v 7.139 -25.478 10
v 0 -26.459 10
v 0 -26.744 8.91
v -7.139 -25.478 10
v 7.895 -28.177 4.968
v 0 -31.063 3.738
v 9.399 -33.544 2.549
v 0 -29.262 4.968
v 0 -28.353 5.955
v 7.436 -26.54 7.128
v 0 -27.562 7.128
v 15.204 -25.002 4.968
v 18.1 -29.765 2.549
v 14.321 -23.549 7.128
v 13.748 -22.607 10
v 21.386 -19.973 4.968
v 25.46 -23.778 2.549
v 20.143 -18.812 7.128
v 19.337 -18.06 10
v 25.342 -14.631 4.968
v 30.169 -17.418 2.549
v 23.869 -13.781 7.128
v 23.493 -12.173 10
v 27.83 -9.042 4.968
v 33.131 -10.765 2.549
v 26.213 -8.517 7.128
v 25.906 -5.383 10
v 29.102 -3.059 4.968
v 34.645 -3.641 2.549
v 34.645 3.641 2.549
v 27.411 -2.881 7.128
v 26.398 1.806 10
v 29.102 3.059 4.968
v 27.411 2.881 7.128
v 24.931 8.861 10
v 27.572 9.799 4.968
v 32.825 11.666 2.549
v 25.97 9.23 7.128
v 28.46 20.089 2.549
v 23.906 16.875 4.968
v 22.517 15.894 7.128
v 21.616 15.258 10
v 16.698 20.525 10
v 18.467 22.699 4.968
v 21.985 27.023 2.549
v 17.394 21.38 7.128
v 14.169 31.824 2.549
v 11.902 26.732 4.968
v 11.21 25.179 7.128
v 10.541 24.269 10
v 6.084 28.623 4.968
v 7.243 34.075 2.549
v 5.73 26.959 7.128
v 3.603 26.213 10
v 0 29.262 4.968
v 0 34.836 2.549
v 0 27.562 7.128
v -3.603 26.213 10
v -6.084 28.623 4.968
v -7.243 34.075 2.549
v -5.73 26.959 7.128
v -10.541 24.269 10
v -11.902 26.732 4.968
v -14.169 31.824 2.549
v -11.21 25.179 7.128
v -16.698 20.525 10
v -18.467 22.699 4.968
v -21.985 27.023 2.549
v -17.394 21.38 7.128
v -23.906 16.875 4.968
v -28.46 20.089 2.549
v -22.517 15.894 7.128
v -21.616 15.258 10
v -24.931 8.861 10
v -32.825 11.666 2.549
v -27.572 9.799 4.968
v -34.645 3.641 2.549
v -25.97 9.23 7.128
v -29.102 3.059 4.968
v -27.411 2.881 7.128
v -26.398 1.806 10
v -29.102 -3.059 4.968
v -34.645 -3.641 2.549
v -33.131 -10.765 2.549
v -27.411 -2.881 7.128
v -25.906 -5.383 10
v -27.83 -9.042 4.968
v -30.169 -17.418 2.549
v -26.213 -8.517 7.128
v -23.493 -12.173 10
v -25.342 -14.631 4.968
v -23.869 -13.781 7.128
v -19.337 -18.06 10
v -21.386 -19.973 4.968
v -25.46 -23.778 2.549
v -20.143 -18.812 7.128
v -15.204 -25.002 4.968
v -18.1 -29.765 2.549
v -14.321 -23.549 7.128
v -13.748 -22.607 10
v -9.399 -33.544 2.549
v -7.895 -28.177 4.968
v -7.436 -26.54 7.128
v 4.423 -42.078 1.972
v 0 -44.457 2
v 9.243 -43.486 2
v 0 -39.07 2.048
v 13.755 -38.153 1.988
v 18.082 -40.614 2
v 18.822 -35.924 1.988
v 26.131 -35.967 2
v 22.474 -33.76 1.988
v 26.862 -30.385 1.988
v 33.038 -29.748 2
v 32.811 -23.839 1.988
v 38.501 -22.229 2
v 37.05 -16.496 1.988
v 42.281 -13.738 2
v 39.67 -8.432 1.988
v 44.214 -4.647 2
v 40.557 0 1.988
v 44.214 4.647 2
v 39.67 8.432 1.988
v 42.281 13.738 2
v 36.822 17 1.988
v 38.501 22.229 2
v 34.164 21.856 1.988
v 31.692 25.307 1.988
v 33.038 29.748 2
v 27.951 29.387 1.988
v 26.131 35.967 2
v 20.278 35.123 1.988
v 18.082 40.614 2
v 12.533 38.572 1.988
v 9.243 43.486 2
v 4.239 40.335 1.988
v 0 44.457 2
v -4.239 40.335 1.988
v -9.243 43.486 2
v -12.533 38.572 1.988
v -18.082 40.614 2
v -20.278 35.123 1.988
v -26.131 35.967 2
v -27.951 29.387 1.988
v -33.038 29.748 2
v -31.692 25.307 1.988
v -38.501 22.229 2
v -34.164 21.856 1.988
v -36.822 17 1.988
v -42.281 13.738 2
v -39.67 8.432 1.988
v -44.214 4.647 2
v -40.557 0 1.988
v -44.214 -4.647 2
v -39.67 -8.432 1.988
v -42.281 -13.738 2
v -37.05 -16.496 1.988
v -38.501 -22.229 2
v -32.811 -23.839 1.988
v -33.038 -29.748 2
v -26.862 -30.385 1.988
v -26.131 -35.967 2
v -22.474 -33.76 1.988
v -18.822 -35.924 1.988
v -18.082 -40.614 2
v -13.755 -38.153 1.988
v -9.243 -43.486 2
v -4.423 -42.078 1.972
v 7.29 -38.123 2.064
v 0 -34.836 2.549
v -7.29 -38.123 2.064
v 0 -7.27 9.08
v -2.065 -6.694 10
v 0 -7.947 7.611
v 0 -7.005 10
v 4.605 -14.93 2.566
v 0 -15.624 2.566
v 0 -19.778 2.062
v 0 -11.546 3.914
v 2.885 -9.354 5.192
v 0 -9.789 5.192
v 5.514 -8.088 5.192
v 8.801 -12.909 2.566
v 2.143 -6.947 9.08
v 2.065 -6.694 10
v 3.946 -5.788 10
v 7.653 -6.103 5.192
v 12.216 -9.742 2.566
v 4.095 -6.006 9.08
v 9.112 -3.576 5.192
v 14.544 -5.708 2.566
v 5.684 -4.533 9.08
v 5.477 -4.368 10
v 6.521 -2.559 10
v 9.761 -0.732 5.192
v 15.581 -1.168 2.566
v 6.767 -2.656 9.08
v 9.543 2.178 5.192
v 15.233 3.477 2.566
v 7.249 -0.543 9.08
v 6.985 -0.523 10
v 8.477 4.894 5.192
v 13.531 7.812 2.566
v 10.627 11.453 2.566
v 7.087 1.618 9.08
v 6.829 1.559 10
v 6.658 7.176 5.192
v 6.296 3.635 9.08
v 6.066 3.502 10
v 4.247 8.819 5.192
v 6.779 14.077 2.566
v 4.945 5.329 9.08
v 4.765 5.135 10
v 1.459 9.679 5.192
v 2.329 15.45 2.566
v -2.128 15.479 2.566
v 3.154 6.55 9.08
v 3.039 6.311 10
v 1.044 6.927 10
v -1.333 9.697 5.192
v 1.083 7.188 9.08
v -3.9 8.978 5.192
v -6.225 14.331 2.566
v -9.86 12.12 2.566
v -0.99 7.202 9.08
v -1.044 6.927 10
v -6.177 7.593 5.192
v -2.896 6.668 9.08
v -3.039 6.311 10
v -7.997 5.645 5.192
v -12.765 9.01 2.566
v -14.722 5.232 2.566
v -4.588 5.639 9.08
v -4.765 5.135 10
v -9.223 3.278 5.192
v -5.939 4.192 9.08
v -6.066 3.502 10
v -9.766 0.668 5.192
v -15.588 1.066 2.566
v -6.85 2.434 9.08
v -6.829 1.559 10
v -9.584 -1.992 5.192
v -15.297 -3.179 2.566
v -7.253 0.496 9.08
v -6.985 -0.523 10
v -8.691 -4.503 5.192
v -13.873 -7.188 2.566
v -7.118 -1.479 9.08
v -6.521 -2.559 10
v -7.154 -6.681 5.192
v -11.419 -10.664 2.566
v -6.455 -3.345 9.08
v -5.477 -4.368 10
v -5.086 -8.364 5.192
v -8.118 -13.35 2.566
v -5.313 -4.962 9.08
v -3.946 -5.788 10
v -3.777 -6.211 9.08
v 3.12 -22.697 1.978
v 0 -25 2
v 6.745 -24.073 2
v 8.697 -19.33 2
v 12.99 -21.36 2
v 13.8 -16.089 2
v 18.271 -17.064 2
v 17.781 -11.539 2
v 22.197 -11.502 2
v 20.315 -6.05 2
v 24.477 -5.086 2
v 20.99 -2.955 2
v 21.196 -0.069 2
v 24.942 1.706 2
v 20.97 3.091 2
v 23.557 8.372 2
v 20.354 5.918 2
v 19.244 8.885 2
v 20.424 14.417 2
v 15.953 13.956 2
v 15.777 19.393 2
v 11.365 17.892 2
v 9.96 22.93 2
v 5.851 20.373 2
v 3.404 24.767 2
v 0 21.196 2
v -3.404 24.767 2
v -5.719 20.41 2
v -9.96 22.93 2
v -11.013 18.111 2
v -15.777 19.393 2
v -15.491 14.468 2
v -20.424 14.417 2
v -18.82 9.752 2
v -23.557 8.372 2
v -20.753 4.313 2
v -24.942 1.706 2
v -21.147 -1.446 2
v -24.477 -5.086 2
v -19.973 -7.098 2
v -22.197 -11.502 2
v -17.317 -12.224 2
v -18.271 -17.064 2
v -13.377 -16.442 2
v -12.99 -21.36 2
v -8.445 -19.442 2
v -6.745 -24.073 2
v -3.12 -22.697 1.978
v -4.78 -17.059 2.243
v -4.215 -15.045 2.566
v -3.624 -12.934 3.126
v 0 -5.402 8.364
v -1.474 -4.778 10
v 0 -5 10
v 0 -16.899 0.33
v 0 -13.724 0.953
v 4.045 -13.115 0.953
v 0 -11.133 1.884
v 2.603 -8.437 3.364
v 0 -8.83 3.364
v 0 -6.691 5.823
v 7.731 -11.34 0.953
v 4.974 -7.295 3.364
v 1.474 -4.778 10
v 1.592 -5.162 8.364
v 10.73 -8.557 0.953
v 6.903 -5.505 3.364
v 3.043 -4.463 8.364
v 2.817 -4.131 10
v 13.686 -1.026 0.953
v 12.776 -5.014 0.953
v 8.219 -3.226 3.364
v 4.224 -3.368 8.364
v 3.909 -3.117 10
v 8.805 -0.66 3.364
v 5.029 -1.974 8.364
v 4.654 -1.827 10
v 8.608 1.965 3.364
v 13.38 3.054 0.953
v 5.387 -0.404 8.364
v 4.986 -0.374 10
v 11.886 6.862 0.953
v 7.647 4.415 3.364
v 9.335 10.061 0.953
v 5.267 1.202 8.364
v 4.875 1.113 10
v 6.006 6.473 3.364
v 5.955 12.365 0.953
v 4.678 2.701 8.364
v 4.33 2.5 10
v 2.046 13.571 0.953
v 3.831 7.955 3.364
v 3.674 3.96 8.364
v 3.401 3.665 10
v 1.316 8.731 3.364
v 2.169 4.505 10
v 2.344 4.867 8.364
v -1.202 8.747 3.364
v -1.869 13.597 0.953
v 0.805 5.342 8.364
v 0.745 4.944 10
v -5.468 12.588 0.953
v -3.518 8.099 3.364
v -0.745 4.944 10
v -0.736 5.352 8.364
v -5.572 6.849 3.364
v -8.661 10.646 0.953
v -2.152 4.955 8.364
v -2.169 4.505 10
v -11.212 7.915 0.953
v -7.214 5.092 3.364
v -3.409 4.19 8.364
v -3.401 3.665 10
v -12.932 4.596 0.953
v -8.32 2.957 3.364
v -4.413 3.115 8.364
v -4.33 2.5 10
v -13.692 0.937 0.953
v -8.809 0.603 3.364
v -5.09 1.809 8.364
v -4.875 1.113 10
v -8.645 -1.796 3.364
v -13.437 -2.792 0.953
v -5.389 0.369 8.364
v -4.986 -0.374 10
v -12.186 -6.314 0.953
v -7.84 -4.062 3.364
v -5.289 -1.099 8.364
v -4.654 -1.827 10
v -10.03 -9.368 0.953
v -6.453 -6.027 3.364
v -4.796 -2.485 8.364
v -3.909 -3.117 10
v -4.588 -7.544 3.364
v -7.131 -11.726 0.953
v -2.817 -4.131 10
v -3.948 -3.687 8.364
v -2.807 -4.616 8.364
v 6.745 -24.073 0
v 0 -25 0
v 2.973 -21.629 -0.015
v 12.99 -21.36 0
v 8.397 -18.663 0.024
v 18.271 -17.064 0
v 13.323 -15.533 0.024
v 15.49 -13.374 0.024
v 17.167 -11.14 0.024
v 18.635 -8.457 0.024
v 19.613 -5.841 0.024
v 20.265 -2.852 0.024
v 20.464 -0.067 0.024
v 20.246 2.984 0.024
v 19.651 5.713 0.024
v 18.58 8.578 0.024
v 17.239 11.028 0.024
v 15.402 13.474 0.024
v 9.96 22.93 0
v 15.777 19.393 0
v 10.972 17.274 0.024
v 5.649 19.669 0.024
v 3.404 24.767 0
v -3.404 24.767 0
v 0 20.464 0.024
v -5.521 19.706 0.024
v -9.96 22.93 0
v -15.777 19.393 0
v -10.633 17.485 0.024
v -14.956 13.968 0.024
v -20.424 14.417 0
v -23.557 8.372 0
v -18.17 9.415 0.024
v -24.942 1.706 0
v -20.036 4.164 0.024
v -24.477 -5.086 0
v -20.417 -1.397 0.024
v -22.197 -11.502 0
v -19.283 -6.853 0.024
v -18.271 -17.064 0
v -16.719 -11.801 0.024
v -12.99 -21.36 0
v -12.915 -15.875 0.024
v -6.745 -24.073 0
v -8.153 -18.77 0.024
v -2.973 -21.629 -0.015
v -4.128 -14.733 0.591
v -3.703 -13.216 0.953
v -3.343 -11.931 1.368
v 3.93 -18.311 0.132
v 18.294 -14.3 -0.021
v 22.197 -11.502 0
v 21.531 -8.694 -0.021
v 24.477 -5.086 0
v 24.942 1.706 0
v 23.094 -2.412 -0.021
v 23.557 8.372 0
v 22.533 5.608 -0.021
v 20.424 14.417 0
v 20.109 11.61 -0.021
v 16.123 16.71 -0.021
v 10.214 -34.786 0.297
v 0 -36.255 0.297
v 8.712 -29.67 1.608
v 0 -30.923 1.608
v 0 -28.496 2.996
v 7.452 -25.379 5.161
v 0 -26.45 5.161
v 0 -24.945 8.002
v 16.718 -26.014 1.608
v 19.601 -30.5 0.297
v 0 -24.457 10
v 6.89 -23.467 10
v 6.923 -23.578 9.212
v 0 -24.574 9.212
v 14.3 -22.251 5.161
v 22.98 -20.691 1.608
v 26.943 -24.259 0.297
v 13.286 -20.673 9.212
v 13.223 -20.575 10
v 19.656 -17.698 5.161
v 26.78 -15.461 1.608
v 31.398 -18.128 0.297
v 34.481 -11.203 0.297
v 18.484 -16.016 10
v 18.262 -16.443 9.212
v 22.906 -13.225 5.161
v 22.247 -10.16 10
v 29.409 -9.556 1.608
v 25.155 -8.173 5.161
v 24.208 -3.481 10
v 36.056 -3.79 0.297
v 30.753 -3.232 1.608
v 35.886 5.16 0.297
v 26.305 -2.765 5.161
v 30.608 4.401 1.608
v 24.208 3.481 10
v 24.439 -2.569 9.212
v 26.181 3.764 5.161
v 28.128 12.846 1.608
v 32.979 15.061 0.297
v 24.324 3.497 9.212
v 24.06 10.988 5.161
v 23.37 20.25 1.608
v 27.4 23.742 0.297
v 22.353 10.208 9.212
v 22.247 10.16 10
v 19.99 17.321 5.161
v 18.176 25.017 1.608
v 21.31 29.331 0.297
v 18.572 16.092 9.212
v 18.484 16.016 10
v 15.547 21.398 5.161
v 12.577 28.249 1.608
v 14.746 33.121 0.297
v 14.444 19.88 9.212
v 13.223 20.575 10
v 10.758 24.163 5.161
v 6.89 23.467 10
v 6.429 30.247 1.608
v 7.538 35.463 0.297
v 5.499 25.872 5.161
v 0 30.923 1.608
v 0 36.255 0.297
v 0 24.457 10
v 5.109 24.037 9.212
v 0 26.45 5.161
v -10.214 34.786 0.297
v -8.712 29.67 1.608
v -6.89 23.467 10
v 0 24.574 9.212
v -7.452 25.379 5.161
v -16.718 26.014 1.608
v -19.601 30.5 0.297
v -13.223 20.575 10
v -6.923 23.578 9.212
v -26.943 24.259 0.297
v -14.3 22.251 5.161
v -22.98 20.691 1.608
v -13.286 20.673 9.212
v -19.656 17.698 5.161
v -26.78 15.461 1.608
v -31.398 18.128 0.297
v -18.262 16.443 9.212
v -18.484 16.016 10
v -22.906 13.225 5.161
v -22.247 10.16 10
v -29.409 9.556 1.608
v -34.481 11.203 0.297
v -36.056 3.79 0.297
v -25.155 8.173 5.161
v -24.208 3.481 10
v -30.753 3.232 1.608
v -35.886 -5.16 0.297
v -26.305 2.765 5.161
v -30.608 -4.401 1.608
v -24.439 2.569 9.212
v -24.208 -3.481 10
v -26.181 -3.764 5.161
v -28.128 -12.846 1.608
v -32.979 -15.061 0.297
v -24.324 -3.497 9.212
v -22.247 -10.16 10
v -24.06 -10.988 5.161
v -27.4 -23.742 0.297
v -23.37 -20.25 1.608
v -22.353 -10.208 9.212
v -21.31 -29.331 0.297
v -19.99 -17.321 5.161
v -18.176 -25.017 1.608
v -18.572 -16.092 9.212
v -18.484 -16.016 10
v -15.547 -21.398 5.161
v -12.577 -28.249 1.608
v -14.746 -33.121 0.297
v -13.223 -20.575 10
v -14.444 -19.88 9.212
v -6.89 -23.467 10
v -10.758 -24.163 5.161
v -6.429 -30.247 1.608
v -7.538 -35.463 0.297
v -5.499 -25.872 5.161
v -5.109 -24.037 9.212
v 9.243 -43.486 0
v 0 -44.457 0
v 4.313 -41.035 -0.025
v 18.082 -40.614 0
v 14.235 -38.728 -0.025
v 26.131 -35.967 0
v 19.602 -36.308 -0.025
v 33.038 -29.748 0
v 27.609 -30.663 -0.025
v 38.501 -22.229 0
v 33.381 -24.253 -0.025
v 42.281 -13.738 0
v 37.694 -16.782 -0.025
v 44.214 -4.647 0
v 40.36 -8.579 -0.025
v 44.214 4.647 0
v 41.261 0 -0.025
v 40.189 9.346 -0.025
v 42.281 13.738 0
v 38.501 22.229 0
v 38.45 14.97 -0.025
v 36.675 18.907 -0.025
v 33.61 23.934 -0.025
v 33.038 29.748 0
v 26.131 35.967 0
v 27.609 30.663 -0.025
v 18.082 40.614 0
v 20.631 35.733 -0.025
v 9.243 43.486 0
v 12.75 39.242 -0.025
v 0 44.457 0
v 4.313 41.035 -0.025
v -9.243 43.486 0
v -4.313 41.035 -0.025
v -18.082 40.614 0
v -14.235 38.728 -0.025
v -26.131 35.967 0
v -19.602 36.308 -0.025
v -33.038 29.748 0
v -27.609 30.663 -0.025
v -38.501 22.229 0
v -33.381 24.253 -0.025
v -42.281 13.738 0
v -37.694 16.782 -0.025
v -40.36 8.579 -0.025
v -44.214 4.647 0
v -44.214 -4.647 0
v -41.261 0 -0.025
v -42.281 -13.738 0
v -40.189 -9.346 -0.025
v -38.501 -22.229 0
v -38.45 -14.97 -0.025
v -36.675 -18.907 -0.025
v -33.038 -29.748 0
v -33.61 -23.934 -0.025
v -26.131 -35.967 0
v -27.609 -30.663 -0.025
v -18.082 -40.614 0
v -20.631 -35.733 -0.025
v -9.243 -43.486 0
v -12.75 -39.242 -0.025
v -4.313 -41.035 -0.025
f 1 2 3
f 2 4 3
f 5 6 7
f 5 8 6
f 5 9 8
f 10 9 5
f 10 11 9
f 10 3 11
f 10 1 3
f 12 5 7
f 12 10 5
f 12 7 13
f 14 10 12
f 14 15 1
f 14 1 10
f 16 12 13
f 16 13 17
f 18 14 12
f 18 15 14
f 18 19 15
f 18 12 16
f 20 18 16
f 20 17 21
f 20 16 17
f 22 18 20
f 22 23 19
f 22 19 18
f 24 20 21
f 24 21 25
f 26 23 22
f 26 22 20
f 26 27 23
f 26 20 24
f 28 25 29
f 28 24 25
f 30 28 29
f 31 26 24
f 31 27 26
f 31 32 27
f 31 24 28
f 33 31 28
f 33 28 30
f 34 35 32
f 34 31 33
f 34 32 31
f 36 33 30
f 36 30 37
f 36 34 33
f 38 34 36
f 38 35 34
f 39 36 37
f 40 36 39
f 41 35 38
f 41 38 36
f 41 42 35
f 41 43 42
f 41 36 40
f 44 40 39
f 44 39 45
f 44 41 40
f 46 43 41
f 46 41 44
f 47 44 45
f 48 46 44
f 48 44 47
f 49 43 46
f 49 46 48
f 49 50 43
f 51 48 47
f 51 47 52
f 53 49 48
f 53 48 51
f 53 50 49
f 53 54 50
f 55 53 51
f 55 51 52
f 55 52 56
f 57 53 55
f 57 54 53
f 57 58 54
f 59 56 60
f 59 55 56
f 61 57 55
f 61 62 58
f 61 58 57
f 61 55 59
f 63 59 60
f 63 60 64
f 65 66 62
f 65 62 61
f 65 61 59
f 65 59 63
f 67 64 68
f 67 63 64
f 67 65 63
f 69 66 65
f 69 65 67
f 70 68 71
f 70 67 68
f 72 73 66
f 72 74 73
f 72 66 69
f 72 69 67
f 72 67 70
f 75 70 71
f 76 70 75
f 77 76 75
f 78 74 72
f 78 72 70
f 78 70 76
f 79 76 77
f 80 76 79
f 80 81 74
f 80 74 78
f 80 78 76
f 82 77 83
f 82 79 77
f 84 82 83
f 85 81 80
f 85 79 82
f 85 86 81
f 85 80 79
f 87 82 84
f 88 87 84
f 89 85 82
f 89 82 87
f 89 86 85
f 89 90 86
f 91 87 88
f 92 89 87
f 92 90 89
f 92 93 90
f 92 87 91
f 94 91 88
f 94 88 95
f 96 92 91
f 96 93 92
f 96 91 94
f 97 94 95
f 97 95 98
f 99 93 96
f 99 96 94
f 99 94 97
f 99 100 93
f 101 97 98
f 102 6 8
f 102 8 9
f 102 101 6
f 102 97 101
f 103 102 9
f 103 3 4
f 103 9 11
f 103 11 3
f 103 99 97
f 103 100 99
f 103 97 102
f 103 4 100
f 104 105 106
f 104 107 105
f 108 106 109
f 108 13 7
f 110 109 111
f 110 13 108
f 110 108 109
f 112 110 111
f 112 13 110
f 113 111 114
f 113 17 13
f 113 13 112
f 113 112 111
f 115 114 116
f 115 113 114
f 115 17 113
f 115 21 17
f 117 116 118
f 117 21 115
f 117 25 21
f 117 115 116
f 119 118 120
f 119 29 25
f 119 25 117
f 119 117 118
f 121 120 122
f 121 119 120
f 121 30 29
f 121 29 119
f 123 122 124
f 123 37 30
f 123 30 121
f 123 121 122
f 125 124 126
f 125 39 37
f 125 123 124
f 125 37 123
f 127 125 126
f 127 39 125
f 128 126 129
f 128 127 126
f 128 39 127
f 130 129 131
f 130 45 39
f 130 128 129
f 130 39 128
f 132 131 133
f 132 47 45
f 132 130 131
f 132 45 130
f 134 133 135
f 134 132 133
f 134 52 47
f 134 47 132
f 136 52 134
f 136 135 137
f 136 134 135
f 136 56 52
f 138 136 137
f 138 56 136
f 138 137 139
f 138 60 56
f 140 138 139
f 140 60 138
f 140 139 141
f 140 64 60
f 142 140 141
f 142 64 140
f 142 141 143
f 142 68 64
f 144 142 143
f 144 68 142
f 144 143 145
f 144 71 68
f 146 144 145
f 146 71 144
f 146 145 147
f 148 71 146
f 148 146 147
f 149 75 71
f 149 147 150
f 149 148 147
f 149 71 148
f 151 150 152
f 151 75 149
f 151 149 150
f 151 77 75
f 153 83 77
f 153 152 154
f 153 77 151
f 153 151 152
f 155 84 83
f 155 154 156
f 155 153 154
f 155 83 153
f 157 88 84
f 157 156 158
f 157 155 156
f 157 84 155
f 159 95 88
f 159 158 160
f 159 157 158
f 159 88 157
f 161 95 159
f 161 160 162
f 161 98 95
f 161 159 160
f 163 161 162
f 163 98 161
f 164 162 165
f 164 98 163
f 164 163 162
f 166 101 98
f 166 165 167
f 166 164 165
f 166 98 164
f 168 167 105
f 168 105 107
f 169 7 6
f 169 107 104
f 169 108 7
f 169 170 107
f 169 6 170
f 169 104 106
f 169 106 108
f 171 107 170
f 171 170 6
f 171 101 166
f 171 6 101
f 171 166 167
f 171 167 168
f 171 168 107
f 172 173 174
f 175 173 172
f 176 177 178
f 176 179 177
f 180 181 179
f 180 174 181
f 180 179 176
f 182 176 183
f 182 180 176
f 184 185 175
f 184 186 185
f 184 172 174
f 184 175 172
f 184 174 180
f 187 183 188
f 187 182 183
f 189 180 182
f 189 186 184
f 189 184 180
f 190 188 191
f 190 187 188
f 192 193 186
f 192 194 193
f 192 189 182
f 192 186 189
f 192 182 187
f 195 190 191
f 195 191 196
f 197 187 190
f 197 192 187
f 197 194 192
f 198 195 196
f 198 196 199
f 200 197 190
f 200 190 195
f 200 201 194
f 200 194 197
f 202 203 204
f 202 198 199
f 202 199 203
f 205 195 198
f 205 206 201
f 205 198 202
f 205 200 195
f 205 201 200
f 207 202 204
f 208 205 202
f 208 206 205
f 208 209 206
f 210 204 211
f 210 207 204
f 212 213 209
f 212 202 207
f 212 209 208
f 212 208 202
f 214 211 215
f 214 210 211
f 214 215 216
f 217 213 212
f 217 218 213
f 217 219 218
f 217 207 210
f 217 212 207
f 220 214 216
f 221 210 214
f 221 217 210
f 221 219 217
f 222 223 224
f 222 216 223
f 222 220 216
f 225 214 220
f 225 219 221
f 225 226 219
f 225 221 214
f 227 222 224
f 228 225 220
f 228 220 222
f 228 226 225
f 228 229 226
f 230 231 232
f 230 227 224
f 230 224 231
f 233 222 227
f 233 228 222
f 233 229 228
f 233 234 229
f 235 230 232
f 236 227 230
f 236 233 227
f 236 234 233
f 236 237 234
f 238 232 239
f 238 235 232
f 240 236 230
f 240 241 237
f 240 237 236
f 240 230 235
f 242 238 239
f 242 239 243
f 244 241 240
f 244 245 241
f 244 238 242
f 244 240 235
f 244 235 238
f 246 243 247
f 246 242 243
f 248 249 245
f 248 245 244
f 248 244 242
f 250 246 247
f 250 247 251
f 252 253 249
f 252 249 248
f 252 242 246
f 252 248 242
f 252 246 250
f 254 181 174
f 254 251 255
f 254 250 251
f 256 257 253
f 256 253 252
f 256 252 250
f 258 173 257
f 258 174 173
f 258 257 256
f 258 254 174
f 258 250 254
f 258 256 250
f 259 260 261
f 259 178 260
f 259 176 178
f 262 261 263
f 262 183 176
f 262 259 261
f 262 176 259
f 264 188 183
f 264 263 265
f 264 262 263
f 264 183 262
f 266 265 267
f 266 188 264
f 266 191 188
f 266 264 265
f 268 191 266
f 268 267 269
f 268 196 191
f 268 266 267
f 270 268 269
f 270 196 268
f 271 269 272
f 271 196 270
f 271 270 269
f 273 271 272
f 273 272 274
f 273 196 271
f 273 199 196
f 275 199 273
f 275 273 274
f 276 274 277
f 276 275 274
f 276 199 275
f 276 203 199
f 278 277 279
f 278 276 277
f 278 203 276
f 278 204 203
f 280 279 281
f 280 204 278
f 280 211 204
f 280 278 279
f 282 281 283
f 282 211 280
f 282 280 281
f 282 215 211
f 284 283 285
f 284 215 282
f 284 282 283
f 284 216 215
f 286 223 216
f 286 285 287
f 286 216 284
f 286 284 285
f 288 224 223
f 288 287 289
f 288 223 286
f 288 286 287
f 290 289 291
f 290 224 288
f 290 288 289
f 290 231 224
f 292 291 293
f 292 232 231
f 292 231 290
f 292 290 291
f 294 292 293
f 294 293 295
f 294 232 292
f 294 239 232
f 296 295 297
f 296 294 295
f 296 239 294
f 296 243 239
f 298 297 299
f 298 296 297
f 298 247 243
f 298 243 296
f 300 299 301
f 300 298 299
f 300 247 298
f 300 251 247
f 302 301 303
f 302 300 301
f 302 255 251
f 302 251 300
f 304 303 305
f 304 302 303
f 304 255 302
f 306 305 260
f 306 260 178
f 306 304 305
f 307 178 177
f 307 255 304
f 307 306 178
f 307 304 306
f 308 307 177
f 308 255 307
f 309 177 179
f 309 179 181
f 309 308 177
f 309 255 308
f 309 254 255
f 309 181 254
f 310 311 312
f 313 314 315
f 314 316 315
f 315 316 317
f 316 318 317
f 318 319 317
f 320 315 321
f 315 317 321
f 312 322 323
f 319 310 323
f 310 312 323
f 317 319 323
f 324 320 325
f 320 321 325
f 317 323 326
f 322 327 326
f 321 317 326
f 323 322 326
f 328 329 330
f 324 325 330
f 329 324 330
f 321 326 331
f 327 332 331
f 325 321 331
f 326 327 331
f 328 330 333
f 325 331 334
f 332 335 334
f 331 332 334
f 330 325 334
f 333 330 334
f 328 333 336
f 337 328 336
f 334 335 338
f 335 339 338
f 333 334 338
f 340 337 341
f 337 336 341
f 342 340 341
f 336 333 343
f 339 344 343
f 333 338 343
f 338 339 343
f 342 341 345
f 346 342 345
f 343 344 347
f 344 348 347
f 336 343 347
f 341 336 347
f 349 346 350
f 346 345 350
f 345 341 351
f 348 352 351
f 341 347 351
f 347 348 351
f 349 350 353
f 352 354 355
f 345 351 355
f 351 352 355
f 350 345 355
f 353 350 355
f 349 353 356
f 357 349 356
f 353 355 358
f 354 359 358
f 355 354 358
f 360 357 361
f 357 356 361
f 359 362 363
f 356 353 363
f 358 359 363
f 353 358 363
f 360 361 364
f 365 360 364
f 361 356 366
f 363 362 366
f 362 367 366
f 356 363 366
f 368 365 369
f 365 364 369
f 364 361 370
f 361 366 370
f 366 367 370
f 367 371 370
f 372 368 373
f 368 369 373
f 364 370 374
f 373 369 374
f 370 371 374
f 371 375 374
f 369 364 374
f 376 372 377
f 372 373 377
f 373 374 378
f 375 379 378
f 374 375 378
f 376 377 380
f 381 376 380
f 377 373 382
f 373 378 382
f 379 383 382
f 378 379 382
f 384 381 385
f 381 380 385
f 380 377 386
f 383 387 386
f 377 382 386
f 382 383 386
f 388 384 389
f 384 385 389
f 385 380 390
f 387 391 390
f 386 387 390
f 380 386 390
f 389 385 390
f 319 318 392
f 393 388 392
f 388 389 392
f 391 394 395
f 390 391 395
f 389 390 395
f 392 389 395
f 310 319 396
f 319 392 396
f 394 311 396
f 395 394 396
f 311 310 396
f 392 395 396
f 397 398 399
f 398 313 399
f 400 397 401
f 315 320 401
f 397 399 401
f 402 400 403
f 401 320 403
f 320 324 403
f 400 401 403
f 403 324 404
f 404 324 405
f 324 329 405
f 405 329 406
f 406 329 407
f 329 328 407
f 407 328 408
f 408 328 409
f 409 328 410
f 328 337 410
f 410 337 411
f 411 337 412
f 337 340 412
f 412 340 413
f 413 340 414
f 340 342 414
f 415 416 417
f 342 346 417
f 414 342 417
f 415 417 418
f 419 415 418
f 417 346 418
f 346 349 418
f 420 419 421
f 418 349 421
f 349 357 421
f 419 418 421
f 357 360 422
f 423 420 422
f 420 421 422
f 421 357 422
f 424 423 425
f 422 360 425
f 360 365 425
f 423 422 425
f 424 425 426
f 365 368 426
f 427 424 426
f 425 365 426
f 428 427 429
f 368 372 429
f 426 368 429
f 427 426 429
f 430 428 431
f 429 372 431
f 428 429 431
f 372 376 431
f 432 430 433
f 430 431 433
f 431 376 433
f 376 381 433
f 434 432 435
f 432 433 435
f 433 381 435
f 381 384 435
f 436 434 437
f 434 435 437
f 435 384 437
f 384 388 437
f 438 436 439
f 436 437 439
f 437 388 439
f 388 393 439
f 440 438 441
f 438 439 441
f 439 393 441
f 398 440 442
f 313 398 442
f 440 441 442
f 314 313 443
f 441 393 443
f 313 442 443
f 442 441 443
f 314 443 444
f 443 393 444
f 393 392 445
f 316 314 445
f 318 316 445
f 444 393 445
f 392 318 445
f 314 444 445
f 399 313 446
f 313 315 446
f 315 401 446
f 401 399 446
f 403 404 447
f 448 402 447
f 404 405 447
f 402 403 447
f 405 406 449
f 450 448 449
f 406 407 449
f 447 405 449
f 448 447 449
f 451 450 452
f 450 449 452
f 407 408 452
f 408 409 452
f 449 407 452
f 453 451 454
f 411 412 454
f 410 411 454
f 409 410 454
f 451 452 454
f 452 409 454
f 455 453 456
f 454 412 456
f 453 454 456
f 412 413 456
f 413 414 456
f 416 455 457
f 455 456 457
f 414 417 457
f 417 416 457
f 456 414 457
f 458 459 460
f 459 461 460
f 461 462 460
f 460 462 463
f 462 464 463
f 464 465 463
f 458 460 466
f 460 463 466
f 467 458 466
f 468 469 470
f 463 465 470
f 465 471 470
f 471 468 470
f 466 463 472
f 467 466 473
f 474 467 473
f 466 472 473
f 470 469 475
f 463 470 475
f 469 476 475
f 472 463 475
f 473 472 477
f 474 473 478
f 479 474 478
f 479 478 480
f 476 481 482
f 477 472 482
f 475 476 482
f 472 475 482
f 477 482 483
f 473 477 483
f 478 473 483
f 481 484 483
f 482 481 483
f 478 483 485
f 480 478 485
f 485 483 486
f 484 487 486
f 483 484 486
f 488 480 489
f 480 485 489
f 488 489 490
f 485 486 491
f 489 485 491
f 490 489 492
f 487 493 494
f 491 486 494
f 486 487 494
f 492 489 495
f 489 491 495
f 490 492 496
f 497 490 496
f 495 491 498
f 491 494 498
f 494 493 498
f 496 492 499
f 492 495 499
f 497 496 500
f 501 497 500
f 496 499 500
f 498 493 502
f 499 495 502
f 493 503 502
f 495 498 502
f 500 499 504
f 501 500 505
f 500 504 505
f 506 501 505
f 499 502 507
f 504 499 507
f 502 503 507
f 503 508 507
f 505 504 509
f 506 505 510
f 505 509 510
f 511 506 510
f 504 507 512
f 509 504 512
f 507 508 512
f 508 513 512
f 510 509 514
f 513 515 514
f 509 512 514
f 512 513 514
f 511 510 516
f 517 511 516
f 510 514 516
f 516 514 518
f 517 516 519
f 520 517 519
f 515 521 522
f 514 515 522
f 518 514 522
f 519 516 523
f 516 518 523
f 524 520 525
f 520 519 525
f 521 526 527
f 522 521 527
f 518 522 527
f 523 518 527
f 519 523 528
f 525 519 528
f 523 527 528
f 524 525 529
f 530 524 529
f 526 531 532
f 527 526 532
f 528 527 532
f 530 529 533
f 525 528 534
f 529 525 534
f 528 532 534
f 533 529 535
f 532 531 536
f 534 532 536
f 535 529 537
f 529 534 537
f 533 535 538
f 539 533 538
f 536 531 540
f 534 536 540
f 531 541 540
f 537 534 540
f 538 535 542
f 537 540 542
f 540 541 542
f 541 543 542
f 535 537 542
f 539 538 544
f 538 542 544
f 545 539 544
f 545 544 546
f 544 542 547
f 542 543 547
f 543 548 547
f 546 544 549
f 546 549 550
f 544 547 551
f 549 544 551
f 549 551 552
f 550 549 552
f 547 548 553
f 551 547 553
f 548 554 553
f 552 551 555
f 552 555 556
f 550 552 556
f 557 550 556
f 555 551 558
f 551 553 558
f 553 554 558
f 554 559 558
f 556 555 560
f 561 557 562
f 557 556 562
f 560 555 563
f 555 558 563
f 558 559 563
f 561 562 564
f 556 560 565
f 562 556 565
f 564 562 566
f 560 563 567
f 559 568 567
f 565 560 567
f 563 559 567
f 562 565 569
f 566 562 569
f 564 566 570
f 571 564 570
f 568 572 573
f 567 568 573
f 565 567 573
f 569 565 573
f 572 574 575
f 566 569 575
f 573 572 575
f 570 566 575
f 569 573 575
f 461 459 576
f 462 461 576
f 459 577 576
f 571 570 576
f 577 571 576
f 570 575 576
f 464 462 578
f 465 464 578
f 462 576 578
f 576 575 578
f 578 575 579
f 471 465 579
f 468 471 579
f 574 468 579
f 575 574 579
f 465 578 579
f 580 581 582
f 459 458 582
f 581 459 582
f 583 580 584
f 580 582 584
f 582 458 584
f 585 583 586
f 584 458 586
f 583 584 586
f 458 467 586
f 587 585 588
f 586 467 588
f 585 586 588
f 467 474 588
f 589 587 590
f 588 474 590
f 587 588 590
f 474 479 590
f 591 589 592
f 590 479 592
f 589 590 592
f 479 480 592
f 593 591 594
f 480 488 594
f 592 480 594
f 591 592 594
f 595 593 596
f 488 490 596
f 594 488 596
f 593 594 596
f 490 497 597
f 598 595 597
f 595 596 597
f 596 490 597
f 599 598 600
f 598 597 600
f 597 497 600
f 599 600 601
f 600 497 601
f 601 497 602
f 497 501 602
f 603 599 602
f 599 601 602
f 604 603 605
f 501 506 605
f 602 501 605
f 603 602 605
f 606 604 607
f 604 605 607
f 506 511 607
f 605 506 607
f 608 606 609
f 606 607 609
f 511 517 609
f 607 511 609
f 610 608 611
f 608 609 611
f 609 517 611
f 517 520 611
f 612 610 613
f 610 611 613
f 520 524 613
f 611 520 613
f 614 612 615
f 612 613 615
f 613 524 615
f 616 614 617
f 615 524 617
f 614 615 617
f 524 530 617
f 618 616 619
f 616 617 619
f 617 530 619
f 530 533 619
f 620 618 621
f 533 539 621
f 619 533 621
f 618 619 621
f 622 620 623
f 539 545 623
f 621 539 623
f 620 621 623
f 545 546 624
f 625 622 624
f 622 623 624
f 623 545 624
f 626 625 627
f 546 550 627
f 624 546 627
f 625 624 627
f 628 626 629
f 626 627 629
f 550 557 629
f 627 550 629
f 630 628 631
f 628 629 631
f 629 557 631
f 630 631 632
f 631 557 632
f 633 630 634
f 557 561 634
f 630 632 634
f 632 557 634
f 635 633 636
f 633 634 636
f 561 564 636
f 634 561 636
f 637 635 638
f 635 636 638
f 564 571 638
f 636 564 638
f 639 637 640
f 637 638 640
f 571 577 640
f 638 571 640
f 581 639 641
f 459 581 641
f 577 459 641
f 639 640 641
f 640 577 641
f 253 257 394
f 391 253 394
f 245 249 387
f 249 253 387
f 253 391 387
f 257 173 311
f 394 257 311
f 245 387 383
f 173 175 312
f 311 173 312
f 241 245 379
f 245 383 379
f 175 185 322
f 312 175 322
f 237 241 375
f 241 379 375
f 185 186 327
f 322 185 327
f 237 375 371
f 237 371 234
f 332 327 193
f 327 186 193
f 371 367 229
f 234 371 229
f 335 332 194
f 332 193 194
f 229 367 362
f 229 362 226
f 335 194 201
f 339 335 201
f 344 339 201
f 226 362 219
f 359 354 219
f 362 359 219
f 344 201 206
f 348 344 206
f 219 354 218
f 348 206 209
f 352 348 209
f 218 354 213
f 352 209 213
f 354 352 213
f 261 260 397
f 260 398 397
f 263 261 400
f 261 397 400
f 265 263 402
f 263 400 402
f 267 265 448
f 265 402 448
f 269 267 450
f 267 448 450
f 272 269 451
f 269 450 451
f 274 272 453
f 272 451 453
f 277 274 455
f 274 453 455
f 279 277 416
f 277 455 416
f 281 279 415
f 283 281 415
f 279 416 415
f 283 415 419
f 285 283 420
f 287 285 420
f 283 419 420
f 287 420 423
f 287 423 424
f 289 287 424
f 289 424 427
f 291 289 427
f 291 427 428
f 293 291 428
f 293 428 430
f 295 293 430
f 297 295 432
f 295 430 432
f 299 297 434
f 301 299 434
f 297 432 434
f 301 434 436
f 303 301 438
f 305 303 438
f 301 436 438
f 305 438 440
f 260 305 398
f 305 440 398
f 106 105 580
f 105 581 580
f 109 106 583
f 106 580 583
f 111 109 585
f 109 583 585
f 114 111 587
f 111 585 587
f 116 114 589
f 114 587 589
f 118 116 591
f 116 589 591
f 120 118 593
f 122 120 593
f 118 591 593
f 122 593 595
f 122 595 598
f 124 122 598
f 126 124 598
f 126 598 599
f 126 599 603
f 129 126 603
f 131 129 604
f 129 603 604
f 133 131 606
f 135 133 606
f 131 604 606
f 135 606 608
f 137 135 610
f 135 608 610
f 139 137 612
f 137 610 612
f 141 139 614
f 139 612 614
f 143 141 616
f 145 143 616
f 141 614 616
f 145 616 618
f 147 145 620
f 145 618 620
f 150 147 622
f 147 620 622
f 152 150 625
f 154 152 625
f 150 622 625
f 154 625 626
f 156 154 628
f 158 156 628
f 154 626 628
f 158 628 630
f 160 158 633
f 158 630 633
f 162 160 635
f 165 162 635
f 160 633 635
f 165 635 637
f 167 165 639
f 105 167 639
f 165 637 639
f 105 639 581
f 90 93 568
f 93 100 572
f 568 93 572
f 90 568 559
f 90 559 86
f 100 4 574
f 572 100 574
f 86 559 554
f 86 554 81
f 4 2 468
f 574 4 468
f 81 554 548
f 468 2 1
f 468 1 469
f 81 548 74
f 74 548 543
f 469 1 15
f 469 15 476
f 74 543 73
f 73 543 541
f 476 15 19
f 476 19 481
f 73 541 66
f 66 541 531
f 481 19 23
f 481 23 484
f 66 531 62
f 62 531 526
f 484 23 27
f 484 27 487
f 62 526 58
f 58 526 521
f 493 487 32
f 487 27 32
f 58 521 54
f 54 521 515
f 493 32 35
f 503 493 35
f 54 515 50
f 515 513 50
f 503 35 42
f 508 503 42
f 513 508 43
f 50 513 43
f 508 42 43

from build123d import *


# Not quite as in the source:
# - ends of sketch curves that miss each other by under 0.0002 mm in the source are joined
# - the dataset's text gives a spline's control points without its knots; the knots are read off the source's solid


with BuildPart() as f1:
    # F0 (on Right) → F1 (revolve)
    with BuildSketch(Plane.YZ):
        with BuildLine():
            Line((-25, 2), (-25, 0))
            add(Edge.make_bspline(
                [(-25, 0), (-23, 0), (-8.2428042968, -0.7589394656), (-5, 9), (-5, 10)],
                knots=[0, 0, 0, 0, 0.5650030571, 1, 1, 1, 1], degree=3))
            Line((-5, 10), (-7.0049383579, 10))
            add(Edge.make_bspline(
                [(-25, 2), (-24.8744459418, 2), (-24.6020502652, 1.997175871), (-23.944655641, 1.9866596386), (-22.9136976758, 1.9733202808), (-21.3996719503, 1.985743252), (-19.1160811737, 2.077743282), (-16.5976005336, 2.3399298707), (-14.1945196869, 2.8670138177), (-12.8187529126, 3.3179992457), (-11.8400283506, 3.7514181037), (-11.2876311756, 4.0507249853), (-10.8861388194, 4.3053949031), (-10.4981730414, 4.5778538923), (-10.0413189077, 4.9474282096), (-9.5365181247, 5.4304731797), (-8.9222342339, 6.1152949724), (-8.3975554045, 6.8420822439), (-7.9652985038, 7.5662331827), (-7.6876671922, 8.0956131465), (-7.4567771073, 8.5983270086), (-7.2726178766, 9.0603628688), (-7.1350687961, 9.4658352411), (-7.0591636163, 9.7405002539), (-7.0261213485, 9.8866268551), (-7.0128338895, 9.9538462647), (-7.0075458312, 9.9839495944), (-7.0052842517, 9.9978468696), (-7.0049383579, 10)],
                knots=[0, 0, 0, 0, 0.0310334646, 0.0620669291, 0.1241338583, 0.1862007874, 0.2482677166, 0.3724015748, 0.434468504, 0.4965354331, 0.5275688977, 0.5586023623, 0.5741190946, 0.5896358268, 0.6206692914, 0.651702756, 0.6827362205, 0.7448031497, 0.7758366143, 0.8068700788, 0.8379035434, 0.868937008, 0.8999704725, 0.9310039371, 0.9465206694, 0.9542790355, 0.9620374017, 0.9635107276, 0.9635107276, 0.9635107276, 0.9635107276], degree=3))
        make_face()
    revolve(axis=Axis((0, 0, 5), (0, 0, 1)))


with BuildPart() as f1b:
    # F0 (on Right) → F1, piece 2 (revolve)
    with BuildSketch(Plane.YZ):
        with BuildLine():
            Line((-44.4571920699, 2), (-44.4571920699, 0))
            add(Edge.make_bspline(
                [(-44.4571920699, 0), (-42.4571920699, 0), (-27.2973141645, -0.8451838413), (-24.4571920699, 9), (-24.4571920699, 10)],
                knots=[0, 0, 0, 0, 0.5690663499, 1, 1, 1, 1], degree=3))
            Line((-24.4571920699, 10), (-26.4591868733, 10))
            add(Edge.make_bspline(
                [(-44.4571920699, 2), (-44.3301263073, 2), (-44.0550017899, 1.9968187714), (-43.3885761174, 1.984637898), (-42.3388801305, 1.9677078809), (-40.7928507171, 1.9742609155), (-39.0423480087, 2.0370462661), (-37.1735164079, 2.1845748373), (-35.2766244821, 2.4434034033), (-33.4457129988, 2.8359140628), (-32.056717366, 3.2865627122), (-31.0771304396, 3.7196898786), (-30.5282614983, 4.0186874168), (-30.1335263651, 4.2717762624), (-29.7544595412, 4.5423113151), (-29.3104788796, 4.9100474895), (-28.8234660731, 5.3917736768), (-28.2348659256, 6.076381331), (-27.7378183493, 6.8052783607), (-27.3332027443, 7.5329427062), (-27.0757776785, 8.0652700313), (-26.863973887, 8.5708812724), (-26.6971113951, 9.0354330637), (-26.5743133468, 9.4428196945), (-26.5078615414, 9.7185644574), (-26.4795083628, 9.8653164013), (-26.4682793946, 9.9328847921), (-26.4625155073, 9.9725570807), (-26.4600673639, 9.9923272701), (-26.4591868733, 10)],
                knots=[0, 0, 0, 0, 0.0311589612, 0.0623179224, 0.1246358447, 0.1869537671, 0.2492716894, 0.3115896118, 0.3739075342, 0.4362254565, 0.4985433789, 0.5297023401, 0.5608613012, 0.5764407818, 0.5920202624, 0.6231792236, 0.6543381848, 0.685497146, 0.7478150683, 0.7789740295, 0.8101329907, 0.8412919518, 0.872450913, 0.9036098742, 0.9347688354, 0.950348316, 0.9581380563, 0.9659277966, 0.9726893525, 0.9726893525, 0.9726893525, 0.9726893525], degree=3))
        make_face()
    revolve(axis=Axis((0, 0, 5), (0, 0, 1)))


solid = Compound([f1.part, f1b.part])
